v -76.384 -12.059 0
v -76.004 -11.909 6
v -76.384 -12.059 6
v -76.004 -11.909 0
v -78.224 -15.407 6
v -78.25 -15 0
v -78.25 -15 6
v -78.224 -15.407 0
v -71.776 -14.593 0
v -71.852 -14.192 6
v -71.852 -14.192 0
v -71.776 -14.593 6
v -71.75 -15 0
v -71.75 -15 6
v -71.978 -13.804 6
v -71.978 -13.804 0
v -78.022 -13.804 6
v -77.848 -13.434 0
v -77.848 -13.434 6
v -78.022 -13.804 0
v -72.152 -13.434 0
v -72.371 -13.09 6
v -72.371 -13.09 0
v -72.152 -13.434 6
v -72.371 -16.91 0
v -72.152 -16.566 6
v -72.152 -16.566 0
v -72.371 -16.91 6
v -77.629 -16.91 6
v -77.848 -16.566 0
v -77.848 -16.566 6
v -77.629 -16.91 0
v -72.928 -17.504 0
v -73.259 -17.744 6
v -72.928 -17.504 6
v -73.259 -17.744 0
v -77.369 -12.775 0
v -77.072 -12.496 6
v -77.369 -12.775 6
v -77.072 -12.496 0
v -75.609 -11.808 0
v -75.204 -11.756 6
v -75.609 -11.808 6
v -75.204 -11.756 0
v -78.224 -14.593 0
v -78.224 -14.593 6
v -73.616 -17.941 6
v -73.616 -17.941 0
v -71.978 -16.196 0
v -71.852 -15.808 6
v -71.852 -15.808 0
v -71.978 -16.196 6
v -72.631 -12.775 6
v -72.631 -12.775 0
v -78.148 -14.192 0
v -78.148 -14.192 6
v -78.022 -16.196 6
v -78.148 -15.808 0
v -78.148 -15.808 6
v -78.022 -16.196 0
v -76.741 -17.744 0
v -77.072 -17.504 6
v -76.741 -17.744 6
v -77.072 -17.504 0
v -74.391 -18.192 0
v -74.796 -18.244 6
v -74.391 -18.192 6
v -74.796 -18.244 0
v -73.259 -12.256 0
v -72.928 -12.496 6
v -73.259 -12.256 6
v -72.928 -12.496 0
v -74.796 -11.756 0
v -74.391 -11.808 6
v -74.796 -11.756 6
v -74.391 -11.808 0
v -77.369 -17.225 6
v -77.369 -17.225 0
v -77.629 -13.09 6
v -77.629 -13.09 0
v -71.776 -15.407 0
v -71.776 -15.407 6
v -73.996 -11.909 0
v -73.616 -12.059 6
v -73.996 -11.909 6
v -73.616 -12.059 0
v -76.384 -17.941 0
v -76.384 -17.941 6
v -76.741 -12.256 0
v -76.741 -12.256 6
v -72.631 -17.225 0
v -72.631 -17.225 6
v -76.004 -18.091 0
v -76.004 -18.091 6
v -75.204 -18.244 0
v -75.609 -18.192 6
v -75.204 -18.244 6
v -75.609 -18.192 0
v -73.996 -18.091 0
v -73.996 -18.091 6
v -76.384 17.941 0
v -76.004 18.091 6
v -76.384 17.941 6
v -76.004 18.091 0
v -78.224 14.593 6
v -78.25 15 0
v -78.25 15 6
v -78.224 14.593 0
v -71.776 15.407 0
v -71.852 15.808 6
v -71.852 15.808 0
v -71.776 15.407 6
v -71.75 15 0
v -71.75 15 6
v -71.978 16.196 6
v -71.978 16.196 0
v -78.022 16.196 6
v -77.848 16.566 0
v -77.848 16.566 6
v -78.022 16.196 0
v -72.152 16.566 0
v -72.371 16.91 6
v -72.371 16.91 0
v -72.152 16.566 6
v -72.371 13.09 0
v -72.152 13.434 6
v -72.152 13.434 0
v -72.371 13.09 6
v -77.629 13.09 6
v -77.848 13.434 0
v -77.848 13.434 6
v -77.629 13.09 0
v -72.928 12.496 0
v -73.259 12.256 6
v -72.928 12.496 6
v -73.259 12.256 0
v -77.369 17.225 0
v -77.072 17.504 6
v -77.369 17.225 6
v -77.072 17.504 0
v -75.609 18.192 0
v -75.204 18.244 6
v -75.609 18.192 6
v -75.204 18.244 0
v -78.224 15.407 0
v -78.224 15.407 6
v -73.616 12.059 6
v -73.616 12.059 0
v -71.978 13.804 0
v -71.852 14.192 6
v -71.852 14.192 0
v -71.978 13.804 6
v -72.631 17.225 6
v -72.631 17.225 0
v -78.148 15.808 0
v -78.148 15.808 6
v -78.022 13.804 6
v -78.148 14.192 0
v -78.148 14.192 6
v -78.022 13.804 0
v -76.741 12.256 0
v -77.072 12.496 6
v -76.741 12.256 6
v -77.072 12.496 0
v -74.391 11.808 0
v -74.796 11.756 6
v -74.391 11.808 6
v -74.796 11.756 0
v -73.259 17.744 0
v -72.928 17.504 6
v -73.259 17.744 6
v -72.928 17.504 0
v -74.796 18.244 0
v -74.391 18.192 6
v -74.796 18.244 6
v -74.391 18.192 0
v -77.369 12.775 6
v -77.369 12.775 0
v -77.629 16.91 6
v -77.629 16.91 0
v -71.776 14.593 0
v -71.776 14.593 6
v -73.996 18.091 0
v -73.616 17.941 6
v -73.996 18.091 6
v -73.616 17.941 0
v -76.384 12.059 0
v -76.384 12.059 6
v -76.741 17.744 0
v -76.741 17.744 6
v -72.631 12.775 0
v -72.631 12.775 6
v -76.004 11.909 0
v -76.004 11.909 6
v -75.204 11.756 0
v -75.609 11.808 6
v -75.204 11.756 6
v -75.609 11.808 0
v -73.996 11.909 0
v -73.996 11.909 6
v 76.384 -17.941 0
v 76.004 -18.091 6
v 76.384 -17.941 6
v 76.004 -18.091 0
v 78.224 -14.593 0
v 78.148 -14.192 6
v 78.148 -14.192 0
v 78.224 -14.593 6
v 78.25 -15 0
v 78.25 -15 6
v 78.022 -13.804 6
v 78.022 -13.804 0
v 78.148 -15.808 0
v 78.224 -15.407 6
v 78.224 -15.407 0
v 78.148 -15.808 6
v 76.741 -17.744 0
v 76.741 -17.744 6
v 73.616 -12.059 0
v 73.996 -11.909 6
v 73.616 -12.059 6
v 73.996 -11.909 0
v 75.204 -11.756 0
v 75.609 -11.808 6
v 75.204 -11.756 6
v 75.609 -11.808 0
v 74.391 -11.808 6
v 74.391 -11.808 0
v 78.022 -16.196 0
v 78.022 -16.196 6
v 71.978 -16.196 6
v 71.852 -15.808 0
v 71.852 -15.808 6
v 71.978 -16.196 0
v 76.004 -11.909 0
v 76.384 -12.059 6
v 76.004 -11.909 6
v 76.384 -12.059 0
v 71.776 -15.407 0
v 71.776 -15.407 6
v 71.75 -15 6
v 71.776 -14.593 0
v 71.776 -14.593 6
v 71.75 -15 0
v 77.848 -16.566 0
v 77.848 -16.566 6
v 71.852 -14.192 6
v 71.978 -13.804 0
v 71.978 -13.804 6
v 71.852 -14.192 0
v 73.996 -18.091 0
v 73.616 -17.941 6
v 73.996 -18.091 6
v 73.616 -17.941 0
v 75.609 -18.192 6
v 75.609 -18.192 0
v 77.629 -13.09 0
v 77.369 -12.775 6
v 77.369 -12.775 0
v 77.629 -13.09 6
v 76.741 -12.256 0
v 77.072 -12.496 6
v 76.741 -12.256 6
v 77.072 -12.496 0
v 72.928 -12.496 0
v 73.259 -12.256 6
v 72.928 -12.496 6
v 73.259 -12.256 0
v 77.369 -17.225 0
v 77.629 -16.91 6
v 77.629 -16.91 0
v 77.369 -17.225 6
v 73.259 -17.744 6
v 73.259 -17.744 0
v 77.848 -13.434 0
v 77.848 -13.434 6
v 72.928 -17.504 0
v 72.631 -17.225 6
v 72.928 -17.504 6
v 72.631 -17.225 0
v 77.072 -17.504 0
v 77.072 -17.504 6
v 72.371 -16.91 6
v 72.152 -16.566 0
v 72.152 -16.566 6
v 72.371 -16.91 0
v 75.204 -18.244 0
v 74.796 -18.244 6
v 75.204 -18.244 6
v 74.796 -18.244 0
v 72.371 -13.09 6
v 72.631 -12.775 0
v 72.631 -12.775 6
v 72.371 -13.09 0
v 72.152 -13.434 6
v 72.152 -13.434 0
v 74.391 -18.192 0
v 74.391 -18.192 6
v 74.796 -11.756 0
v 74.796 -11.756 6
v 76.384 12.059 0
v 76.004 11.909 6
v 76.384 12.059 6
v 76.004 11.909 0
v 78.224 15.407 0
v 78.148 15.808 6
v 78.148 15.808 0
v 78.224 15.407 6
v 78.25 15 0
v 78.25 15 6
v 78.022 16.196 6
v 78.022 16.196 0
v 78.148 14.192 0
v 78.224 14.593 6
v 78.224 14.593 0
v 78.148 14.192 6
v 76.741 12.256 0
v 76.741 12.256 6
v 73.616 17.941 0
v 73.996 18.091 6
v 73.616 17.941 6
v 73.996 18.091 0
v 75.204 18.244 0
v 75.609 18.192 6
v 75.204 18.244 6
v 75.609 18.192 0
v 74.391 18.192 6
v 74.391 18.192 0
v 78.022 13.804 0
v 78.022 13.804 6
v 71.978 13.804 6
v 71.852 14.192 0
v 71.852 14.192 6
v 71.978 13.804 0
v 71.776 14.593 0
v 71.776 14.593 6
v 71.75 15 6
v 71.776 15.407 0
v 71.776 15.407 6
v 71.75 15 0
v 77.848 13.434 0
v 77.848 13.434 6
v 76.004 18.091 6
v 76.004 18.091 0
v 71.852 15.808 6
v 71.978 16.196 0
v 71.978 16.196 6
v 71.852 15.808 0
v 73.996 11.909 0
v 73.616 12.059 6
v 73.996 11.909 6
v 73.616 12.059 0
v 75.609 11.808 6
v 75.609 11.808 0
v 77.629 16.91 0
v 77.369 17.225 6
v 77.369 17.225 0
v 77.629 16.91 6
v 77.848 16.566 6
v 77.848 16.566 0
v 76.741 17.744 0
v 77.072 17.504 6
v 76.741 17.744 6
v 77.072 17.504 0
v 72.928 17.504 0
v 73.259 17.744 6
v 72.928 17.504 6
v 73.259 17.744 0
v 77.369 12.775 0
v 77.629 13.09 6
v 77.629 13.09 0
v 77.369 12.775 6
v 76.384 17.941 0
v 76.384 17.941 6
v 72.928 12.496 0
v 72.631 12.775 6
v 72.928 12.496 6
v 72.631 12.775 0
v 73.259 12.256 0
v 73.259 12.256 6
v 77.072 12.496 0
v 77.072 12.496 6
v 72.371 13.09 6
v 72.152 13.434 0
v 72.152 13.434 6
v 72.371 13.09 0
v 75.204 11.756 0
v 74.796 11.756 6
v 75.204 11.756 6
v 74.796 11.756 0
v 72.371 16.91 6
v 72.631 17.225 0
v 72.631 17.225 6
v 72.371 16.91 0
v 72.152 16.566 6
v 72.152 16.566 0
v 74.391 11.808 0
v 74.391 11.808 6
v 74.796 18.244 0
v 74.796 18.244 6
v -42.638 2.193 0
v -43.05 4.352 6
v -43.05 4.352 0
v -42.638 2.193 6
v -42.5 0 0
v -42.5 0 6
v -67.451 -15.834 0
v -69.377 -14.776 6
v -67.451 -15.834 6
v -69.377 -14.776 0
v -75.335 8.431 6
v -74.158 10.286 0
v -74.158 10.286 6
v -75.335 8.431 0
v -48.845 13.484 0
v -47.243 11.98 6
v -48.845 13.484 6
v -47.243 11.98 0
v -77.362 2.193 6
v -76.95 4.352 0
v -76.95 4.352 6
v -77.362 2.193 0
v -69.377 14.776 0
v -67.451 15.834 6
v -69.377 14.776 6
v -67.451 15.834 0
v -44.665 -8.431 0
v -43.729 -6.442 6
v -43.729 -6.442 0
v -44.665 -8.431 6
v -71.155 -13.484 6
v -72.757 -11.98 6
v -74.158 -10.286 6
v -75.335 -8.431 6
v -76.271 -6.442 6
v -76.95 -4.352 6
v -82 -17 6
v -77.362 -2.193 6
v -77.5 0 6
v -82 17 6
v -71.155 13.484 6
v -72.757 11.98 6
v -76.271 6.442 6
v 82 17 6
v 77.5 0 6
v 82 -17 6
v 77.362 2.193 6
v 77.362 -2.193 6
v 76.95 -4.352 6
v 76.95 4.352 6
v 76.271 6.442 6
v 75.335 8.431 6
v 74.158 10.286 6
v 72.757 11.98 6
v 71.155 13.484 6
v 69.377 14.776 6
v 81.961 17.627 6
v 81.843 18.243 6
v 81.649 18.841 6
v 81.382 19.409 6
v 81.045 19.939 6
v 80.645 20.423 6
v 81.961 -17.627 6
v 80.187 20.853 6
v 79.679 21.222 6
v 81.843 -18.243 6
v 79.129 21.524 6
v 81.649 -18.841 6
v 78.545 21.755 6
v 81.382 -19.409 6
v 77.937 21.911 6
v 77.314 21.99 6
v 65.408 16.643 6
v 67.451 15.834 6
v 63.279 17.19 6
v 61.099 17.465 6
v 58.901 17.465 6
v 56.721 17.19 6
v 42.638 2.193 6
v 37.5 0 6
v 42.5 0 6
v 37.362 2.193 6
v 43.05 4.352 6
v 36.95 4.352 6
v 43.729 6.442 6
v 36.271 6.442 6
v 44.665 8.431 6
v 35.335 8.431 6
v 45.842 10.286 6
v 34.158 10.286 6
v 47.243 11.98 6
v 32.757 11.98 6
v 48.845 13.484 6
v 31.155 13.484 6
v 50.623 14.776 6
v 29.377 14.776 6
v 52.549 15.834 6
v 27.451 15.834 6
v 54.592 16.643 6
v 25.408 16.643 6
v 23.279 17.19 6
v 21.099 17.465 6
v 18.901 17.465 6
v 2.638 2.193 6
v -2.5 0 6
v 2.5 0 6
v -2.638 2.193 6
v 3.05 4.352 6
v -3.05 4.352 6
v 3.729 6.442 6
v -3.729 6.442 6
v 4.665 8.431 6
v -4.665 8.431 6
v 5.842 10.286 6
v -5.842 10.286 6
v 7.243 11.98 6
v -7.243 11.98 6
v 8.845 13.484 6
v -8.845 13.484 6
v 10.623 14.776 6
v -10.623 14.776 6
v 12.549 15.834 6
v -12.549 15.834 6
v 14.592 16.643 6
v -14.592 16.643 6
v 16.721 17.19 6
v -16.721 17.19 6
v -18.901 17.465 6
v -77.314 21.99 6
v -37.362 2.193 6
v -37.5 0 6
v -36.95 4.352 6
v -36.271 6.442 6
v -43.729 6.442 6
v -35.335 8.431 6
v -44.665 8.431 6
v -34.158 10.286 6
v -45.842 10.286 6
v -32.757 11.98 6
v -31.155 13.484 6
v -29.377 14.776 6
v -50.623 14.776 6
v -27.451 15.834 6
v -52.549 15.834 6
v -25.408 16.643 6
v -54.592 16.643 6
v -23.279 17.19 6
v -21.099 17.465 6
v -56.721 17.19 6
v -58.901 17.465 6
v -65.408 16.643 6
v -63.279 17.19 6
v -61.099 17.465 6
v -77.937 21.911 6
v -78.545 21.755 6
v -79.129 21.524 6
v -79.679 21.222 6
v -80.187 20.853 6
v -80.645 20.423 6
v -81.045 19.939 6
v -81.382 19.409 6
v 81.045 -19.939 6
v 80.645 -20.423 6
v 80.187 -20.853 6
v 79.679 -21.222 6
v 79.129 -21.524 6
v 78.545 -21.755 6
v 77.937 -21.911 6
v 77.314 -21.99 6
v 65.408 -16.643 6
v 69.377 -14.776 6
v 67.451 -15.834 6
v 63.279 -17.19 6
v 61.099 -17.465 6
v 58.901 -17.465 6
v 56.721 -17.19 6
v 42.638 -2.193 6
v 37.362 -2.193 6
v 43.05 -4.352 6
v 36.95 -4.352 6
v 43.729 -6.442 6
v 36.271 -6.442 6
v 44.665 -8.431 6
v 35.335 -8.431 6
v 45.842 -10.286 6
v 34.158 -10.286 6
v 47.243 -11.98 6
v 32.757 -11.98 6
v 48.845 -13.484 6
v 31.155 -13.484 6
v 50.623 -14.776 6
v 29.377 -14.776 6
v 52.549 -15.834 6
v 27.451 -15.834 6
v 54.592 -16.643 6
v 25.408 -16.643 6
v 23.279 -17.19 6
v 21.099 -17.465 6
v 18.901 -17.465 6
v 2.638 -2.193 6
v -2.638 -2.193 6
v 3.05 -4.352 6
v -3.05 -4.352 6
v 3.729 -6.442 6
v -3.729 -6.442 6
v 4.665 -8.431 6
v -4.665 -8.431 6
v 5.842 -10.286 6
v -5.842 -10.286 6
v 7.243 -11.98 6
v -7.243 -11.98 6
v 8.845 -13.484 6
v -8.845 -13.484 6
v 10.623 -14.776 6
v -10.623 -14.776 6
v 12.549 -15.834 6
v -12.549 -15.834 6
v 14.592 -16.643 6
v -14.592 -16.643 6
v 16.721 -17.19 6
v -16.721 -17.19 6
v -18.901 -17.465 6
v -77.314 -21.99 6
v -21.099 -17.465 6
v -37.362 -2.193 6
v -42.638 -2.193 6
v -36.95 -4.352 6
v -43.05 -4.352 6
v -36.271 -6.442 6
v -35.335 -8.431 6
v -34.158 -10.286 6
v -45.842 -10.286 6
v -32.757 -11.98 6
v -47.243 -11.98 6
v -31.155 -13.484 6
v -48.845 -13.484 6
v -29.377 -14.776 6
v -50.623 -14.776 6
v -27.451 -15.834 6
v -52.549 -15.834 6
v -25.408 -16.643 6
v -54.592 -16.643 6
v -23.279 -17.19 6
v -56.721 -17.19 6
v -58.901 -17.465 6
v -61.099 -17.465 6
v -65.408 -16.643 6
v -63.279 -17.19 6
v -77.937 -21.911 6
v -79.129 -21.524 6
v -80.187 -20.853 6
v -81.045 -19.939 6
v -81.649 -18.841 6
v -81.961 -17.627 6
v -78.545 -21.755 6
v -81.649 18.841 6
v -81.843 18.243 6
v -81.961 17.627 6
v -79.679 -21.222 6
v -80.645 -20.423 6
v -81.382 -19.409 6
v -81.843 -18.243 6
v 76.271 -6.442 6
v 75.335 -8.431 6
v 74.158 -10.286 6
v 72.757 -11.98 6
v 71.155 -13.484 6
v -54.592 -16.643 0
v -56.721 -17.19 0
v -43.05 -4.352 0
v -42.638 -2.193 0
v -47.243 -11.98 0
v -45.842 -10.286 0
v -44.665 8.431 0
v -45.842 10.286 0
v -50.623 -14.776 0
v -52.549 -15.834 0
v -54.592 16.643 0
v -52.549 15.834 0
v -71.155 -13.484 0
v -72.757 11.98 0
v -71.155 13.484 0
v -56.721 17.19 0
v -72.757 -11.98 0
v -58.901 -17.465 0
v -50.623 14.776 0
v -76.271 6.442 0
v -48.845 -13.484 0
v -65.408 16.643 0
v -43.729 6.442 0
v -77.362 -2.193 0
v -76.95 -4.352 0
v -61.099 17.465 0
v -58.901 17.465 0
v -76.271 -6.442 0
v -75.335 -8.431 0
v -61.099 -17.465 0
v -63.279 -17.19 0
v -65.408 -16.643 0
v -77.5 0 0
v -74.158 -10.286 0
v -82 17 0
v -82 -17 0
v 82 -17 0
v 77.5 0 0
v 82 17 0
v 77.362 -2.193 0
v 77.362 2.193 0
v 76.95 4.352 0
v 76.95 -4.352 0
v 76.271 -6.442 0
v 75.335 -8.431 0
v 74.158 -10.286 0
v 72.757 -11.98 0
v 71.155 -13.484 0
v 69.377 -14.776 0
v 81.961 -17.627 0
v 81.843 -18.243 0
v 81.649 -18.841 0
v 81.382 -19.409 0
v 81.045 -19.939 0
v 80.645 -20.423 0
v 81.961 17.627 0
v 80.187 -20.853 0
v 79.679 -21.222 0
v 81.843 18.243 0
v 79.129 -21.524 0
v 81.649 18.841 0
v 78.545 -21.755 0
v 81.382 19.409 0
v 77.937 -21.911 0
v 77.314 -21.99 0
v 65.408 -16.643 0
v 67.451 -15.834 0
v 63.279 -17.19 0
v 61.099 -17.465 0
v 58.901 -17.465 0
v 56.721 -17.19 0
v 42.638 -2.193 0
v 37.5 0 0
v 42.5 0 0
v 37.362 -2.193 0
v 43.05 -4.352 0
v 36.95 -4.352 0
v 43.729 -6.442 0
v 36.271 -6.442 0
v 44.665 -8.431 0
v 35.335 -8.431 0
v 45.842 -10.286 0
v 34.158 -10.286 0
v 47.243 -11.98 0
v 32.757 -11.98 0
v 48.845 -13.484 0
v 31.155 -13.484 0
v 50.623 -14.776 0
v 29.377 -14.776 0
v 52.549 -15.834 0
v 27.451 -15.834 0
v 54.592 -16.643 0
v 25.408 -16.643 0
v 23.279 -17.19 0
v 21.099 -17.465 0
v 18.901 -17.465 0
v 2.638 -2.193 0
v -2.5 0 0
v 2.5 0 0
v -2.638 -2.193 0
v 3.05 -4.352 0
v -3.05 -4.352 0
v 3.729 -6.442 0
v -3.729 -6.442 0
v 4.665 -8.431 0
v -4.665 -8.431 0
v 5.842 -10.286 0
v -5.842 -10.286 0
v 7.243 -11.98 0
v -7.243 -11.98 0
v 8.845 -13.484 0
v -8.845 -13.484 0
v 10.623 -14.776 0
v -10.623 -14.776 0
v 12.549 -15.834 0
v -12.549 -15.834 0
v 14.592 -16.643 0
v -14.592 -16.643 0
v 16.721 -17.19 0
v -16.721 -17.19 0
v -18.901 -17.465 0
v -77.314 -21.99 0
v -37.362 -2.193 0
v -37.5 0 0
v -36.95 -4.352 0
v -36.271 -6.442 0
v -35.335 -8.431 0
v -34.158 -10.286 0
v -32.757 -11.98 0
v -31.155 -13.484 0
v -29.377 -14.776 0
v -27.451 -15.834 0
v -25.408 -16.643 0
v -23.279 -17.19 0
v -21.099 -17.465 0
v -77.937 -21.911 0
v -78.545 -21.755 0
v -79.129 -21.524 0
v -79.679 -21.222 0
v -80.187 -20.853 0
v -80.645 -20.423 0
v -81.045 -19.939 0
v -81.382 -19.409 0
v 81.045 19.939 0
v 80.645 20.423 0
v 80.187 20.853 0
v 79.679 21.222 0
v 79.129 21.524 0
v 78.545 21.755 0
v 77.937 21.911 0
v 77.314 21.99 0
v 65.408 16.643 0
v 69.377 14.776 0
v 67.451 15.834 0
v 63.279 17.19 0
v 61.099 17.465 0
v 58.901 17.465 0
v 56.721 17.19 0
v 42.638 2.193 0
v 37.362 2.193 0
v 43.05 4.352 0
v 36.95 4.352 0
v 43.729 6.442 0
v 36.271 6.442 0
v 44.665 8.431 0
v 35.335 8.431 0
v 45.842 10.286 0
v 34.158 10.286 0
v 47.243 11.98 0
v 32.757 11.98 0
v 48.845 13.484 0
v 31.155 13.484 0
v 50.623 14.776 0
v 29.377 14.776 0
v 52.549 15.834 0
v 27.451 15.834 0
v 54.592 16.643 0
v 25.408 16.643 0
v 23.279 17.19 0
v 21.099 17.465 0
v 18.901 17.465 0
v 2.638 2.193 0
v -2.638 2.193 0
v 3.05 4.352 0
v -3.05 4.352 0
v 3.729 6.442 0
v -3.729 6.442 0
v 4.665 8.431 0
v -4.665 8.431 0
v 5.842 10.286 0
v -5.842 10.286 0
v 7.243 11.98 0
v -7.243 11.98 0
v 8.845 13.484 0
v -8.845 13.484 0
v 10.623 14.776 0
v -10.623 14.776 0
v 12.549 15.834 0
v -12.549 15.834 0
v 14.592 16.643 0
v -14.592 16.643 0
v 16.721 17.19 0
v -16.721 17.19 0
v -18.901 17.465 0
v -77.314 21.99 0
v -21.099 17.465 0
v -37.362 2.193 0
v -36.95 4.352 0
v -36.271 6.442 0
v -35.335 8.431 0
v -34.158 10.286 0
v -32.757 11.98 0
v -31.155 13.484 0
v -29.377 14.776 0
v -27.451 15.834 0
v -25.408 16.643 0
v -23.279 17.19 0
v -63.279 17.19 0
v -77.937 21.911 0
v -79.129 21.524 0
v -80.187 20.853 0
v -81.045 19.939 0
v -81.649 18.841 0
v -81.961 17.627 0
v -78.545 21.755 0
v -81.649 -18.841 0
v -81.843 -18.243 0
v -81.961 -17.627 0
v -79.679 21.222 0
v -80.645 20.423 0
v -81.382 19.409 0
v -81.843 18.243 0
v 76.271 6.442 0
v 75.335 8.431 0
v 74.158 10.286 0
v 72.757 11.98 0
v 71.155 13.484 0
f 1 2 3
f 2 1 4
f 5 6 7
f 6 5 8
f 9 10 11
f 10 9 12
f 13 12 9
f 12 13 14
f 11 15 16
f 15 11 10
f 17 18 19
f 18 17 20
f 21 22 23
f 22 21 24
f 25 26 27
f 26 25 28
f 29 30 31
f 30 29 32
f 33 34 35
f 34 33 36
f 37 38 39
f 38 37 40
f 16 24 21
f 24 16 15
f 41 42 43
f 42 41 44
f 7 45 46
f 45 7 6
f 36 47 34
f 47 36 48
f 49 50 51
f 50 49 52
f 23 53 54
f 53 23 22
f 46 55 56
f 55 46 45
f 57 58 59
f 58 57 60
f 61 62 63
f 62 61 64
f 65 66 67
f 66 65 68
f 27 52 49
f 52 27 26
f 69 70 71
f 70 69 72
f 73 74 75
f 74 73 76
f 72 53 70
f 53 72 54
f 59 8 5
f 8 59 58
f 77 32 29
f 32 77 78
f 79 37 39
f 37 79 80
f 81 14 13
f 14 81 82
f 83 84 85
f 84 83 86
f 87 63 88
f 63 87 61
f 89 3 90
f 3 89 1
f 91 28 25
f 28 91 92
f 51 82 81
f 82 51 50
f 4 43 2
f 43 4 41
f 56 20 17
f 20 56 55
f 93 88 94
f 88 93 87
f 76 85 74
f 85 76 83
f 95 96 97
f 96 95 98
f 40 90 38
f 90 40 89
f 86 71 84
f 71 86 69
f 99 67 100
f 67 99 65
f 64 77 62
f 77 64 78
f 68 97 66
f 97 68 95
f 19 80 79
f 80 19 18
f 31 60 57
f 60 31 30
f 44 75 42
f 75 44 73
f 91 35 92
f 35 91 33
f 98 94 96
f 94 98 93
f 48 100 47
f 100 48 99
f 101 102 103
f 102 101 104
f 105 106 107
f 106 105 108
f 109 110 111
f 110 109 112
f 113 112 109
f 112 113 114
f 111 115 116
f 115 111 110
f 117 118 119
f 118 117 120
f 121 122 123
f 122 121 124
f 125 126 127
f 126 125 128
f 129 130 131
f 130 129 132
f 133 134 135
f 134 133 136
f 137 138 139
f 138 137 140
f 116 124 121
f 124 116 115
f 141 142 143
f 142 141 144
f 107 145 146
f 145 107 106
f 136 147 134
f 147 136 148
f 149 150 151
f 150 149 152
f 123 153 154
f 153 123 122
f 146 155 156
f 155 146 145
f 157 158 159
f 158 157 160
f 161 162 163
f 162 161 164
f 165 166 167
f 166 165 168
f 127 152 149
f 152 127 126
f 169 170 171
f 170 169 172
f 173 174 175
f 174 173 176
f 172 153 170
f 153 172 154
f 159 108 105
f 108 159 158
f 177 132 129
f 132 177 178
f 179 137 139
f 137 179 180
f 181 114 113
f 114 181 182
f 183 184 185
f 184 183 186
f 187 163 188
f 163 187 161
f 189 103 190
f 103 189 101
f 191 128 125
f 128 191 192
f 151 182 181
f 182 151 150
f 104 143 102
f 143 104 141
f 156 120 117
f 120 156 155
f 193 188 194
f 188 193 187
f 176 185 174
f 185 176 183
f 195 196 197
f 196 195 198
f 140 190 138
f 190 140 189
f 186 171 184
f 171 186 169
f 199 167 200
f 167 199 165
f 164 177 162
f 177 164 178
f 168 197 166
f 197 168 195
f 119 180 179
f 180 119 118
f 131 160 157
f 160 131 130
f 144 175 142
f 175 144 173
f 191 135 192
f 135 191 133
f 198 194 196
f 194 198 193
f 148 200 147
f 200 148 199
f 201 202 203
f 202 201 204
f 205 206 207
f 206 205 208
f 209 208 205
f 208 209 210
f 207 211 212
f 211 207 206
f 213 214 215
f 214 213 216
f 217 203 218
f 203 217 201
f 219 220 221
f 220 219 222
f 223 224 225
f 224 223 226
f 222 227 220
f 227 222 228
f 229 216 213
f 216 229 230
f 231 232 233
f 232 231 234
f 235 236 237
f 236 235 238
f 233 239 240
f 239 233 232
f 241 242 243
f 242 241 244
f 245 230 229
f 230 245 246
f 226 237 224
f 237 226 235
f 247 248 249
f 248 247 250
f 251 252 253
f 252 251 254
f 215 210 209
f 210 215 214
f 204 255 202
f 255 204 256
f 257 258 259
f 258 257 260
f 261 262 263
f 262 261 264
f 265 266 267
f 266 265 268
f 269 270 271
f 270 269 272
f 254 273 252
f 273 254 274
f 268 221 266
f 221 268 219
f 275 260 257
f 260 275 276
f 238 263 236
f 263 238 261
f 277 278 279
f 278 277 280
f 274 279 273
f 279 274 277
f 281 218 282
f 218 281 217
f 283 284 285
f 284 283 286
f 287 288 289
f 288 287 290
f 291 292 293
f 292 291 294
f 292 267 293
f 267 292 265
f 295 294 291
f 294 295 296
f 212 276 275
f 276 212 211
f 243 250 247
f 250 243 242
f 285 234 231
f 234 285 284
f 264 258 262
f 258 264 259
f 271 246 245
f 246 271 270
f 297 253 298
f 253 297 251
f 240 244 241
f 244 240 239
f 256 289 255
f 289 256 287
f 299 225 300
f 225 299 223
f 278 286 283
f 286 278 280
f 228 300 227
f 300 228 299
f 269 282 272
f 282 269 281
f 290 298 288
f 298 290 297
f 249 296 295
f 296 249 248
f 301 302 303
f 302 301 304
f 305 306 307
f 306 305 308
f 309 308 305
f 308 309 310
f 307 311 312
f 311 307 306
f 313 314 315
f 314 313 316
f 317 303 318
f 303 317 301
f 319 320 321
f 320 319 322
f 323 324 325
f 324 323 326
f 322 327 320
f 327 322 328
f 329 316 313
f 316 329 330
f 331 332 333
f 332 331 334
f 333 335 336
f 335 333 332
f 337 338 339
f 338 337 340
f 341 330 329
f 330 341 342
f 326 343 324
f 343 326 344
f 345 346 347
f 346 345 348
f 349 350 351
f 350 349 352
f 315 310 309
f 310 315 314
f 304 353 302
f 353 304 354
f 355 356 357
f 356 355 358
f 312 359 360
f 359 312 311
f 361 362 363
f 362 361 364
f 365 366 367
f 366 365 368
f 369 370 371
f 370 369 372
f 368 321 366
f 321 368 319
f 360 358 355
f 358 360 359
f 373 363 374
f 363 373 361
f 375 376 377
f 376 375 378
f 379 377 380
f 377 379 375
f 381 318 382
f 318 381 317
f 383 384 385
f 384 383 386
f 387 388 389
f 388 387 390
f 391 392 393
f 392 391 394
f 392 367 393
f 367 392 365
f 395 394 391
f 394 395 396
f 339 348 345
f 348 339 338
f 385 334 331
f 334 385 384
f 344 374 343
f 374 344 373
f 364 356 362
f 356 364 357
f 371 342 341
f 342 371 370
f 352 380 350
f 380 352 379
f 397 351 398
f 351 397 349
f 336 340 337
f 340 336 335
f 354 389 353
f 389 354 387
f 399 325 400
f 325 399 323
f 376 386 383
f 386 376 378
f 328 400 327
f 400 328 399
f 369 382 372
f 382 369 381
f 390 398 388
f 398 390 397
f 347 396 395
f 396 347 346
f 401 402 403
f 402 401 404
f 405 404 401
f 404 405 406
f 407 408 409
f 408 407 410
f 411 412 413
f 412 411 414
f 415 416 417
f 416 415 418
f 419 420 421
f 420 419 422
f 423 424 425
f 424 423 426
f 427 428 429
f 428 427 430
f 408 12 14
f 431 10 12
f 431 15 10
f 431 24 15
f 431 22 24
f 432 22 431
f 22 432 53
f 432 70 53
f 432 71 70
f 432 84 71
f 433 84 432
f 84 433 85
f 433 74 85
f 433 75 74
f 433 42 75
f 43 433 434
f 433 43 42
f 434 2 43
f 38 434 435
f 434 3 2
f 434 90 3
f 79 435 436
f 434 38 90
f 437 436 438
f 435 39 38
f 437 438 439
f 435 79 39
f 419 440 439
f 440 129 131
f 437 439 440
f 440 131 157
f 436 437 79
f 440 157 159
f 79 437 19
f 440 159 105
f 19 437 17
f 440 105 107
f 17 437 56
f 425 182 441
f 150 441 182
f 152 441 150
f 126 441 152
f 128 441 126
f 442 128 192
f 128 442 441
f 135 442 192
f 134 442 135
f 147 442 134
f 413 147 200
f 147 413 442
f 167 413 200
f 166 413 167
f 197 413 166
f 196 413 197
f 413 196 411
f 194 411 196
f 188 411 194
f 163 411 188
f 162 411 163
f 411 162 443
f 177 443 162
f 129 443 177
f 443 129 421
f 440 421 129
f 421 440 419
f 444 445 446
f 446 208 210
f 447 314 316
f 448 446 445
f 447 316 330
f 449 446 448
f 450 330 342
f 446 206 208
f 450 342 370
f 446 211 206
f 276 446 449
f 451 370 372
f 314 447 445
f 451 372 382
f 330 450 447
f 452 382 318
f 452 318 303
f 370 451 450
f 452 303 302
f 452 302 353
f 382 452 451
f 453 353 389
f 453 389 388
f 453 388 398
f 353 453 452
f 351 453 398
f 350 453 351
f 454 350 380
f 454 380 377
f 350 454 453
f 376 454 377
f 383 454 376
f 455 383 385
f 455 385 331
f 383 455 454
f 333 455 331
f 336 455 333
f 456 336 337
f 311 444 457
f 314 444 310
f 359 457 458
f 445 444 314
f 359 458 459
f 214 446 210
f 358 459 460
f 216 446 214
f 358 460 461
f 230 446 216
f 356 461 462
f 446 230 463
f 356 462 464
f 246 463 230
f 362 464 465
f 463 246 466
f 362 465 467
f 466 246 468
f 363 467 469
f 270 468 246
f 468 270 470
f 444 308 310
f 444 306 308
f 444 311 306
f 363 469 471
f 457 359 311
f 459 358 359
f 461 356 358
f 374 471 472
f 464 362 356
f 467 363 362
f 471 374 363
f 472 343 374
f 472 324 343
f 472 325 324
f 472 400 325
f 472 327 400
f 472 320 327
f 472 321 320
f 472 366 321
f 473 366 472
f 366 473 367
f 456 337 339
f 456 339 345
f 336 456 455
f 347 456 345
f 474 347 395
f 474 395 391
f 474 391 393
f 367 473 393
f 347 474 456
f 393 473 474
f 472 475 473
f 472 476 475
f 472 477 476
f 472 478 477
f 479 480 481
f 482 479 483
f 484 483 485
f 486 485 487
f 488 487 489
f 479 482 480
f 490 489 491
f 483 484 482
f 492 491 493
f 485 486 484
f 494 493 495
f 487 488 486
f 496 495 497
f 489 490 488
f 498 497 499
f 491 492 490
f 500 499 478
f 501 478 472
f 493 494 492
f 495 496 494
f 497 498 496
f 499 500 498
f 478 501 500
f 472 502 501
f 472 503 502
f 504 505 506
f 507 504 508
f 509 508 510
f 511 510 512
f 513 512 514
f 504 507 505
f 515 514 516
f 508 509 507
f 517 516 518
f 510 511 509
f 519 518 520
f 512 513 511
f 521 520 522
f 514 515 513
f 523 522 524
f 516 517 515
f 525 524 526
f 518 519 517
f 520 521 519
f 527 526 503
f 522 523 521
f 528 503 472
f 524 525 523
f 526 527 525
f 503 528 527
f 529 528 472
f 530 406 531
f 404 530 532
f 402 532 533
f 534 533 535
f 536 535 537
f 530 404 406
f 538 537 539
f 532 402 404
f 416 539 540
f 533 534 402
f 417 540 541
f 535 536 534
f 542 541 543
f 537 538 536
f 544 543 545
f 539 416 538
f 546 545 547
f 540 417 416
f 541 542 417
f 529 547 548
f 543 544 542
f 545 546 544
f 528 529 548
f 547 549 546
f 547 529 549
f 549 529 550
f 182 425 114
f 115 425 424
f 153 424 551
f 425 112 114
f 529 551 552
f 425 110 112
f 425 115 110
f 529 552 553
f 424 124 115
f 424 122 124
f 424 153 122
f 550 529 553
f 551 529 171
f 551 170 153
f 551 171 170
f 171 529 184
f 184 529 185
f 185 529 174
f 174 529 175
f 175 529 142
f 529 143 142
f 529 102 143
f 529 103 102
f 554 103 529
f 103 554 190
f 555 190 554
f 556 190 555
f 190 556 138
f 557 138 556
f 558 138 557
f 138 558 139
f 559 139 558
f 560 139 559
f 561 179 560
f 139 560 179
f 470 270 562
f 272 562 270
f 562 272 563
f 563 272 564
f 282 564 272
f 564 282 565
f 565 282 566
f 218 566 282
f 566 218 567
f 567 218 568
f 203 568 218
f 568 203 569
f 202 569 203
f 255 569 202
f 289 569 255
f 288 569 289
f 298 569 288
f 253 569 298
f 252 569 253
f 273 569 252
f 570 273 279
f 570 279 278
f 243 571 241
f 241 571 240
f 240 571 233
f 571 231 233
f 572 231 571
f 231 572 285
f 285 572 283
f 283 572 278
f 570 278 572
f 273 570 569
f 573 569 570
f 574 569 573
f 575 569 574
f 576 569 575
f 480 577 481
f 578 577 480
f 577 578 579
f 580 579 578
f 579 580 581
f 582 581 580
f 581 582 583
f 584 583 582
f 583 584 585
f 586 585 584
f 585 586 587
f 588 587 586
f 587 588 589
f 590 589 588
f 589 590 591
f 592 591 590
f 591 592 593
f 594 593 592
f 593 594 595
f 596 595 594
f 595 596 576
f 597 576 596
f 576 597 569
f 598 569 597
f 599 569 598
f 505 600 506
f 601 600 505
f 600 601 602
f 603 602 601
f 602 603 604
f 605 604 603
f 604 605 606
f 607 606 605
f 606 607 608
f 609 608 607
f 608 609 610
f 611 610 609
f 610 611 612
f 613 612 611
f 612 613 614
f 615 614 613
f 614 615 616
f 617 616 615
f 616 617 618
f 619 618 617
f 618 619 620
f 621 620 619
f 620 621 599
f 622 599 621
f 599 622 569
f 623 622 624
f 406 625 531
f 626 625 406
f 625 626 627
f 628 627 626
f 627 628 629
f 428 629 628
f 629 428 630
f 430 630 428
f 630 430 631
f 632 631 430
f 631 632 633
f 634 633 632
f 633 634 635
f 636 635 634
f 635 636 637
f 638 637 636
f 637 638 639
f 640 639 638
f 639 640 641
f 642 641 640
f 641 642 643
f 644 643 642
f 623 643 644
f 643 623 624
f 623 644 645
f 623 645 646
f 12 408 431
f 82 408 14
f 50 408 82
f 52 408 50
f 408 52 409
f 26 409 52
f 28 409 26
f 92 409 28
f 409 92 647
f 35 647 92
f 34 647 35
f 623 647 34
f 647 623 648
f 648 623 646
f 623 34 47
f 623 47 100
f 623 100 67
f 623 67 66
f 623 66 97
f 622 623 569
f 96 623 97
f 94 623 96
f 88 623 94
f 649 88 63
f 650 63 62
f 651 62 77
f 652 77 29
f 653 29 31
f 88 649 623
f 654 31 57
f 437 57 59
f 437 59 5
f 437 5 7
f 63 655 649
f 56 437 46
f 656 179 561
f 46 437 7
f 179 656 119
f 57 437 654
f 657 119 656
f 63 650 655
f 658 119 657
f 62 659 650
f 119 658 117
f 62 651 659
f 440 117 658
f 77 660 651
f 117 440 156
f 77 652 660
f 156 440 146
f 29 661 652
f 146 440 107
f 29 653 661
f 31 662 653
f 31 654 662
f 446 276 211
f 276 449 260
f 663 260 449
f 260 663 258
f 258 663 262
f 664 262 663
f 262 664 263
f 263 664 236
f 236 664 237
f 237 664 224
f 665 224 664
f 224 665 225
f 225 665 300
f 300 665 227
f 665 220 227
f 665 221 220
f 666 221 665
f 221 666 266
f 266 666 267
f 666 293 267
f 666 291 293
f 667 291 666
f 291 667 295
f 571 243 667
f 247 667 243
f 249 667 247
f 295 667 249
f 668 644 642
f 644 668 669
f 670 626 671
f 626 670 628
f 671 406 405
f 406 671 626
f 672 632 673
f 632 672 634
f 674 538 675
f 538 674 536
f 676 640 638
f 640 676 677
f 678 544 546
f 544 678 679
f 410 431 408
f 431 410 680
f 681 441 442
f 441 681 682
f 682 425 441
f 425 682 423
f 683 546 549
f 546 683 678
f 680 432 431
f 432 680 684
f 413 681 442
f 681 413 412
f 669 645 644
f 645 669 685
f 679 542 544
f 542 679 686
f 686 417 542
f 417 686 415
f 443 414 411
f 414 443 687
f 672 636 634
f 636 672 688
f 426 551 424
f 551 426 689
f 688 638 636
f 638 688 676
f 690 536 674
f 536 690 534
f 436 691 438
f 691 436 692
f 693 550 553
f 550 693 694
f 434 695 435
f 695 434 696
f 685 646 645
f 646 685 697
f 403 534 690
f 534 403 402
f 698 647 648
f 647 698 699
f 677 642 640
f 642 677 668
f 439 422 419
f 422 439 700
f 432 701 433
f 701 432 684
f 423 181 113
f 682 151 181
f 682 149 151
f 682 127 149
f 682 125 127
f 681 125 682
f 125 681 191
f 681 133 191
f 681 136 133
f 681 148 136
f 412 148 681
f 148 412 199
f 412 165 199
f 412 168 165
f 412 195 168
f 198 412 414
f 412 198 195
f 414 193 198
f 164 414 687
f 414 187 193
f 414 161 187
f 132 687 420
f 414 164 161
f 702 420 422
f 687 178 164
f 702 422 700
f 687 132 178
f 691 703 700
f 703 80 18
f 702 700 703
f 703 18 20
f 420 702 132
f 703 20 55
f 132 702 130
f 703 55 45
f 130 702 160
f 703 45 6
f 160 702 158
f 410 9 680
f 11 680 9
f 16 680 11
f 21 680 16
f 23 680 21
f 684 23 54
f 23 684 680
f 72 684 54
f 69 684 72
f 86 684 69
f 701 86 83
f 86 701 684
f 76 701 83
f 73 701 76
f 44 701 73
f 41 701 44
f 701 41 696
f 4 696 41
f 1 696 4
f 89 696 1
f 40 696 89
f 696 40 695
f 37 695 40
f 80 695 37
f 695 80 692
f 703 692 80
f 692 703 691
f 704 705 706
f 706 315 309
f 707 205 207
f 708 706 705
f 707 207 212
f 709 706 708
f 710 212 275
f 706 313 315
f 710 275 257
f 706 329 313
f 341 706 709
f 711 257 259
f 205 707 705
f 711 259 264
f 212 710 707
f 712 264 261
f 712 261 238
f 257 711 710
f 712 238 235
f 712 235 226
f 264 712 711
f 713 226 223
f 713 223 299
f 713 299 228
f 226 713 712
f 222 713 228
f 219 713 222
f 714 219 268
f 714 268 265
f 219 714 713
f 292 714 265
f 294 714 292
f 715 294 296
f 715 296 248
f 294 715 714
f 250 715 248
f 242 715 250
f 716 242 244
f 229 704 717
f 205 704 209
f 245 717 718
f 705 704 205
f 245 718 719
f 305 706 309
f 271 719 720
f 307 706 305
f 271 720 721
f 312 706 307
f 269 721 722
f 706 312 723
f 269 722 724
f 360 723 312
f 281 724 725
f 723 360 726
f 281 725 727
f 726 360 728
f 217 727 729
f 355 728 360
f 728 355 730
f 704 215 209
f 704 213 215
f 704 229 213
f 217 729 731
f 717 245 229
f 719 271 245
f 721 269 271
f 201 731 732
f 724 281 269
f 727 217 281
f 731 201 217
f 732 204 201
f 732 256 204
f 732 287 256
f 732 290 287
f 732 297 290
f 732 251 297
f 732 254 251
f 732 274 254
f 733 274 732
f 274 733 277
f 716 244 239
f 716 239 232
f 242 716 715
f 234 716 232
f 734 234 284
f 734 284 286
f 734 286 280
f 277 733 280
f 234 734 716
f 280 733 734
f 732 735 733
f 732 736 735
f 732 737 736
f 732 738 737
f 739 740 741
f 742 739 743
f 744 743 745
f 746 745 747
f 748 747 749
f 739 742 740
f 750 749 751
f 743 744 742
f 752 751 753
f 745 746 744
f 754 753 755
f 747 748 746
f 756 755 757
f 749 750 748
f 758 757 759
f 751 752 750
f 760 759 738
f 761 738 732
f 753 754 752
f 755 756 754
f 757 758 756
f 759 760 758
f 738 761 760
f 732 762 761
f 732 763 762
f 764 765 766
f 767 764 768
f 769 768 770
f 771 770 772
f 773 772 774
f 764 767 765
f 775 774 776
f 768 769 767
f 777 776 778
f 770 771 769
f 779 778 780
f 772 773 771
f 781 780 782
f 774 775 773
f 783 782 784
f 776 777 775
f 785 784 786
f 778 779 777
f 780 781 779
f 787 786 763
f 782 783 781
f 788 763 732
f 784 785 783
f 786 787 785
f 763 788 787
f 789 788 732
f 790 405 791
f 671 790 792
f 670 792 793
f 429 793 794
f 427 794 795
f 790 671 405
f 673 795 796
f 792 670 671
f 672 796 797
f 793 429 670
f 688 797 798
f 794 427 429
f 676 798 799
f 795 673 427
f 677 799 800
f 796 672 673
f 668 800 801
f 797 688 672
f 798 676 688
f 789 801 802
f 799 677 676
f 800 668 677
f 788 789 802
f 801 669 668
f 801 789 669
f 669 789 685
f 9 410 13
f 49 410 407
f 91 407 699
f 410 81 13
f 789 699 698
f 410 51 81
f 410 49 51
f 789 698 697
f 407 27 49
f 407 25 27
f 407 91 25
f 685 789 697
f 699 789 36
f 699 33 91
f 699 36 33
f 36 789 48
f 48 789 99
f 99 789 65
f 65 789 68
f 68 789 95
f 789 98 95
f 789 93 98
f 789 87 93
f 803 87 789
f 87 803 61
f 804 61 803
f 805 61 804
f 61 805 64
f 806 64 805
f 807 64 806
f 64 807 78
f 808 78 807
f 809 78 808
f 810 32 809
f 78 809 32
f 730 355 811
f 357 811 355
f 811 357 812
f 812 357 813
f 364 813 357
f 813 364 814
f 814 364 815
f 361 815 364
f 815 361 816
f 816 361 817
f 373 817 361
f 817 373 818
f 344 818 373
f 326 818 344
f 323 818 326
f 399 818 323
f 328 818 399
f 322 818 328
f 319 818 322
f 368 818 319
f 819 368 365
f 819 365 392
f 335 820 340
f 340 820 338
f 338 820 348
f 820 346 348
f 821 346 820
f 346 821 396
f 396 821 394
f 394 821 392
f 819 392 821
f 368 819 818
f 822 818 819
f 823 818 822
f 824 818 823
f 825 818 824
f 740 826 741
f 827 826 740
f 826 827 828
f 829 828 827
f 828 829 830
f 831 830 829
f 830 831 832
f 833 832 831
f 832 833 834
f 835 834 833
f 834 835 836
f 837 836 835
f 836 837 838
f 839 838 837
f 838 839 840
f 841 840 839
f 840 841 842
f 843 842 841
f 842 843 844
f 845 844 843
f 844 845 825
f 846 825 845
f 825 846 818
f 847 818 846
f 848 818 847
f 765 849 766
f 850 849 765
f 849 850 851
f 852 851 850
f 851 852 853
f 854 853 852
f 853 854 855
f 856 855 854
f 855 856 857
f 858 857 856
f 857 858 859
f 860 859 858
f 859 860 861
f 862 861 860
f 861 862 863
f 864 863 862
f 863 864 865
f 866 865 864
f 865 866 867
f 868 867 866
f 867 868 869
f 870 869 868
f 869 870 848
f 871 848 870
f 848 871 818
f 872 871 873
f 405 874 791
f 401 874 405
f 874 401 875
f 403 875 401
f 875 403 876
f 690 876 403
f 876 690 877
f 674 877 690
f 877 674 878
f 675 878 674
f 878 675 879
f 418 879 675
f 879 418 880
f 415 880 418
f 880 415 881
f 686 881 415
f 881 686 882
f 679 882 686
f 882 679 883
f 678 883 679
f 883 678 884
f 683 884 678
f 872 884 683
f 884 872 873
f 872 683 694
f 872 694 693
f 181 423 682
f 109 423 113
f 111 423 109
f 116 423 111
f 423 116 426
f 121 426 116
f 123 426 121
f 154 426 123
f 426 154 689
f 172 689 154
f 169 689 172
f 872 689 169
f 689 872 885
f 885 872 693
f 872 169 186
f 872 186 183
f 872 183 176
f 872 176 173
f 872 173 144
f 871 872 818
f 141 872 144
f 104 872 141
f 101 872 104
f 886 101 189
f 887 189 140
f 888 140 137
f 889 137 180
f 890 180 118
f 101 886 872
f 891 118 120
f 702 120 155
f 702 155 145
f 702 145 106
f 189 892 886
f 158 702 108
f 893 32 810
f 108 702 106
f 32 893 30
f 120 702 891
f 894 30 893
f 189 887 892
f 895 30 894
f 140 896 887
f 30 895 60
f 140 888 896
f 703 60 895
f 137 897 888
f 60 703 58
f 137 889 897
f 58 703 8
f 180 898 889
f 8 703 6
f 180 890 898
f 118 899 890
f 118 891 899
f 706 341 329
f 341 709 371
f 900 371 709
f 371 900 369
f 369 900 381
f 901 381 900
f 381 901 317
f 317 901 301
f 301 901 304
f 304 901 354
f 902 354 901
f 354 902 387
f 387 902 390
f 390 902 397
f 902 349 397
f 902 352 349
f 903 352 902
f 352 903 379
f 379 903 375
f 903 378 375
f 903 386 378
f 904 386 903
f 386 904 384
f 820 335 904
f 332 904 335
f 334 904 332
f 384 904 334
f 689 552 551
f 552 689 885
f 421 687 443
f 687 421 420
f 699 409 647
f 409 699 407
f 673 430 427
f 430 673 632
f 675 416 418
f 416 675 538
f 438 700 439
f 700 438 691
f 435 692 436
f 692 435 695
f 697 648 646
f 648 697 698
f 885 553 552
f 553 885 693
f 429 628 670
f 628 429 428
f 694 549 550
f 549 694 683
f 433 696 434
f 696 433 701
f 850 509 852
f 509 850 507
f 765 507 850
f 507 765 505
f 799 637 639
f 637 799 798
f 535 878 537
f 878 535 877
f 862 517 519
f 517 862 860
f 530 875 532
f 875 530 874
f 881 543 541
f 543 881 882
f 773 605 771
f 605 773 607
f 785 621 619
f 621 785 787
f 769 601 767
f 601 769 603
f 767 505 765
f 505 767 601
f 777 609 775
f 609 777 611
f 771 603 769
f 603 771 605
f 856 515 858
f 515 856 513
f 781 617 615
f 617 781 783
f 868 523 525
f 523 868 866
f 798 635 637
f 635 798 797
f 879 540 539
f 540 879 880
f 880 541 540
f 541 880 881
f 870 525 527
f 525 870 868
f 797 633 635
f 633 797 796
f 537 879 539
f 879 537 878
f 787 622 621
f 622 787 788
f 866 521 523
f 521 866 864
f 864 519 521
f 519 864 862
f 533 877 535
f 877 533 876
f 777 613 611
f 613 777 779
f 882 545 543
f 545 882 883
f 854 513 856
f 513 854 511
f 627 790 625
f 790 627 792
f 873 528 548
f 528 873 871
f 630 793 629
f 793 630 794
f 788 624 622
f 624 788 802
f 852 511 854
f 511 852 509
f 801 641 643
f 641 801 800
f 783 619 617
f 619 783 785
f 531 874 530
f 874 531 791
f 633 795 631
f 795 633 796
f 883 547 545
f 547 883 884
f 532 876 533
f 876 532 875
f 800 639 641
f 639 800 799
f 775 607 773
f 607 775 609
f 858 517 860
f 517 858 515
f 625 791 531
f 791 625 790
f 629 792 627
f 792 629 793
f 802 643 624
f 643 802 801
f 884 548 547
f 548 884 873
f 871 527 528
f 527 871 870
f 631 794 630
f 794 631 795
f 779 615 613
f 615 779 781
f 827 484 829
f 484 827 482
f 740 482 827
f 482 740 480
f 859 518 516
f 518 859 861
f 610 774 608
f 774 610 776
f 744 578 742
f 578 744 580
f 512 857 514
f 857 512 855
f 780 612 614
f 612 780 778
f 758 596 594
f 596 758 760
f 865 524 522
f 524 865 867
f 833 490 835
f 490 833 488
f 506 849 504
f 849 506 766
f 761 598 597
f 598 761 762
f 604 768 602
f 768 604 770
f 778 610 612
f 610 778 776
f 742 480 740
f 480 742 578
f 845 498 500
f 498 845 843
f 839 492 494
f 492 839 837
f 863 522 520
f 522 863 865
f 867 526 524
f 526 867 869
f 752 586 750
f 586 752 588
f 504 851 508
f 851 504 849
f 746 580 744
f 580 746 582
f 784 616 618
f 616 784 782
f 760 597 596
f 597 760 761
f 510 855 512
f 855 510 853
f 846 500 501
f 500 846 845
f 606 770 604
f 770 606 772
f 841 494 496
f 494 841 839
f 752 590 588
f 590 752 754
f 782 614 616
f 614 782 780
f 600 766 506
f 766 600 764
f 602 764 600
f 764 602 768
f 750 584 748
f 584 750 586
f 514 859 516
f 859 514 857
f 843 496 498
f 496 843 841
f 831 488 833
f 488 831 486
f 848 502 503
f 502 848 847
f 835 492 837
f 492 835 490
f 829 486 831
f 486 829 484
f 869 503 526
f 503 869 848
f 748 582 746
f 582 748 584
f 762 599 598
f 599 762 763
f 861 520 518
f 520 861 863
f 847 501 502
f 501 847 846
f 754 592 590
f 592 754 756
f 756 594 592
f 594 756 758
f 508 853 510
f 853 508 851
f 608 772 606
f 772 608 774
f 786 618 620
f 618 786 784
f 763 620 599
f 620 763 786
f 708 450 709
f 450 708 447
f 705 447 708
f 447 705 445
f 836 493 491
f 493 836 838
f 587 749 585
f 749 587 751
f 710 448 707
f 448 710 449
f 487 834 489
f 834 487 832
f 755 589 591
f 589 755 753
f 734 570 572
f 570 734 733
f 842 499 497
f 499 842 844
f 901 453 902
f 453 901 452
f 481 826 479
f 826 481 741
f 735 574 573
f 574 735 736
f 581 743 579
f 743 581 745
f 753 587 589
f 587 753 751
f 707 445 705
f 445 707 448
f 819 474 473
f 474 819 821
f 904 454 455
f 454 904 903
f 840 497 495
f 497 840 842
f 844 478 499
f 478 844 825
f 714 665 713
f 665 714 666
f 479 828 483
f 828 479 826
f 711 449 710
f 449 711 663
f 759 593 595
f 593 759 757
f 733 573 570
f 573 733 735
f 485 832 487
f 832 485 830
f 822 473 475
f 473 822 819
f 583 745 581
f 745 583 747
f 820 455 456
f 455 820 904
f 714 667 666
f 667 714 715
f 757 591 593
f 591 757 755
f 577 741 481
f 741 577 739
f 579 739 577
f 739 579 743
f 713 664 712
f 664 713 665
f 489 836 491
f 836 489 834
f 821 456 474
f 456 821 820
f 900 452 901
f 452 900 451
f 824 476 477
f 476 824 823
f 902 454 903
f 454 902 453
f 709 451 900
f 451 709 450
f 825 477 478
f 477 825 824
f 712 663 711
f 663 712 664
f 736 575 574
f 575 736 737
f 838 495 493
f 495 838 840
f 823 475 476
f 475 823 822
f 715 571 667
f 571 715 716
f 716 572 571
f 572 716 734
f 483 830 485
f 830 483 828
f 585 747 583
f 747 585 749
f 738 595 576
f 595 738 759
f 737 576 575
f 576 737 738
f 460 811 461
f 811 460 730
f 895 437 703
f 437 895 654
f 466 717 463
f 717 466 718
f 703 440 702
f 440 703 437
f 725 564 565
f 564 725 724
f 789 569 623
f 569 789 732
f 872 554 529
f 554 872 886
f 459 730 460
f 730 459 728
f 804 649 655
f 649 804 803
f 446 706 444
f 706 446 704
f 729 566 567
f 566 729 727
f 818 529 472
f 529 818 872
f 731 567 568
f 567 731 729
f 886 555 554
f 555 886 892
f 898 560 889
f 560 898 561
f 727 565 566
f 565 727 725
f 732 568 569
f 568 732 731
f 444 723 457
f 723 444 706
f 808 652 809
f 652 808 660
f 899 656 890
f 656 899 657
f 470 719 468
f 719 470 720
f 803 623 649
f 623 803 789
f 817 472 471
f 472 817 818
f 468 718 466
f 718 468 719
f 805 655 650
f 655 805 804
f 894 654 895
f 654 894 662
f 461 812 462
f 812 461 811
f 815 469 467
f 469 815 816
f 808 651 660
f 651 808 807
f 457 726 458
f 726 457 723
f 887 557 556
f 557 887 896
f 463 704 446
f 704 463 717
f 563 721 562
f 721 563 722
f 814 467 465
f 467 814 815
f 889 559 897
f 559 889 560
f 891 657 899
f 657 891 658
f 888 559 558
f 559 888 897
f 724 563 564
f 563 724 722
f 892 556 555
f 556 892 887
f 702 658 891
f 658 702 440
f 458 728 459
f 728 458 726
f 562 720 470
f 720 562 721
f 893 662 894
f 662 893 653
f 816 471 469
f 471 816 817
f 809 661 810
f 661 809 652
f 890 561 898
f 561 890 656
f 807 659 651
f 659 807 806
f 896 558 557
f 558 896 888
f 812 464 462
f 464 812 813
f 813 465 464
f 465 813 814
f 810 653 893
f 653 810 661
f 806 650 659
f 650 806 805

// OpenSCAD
$fn = 50;


difference() {
	union() {
		hull() {
			translate(v = [-77.0000000000, 17.0000000000, 0]) {
				cylinder(h = 6, r = 5);
			}
			translate(v = [77.0000000000, 17.0000000000, 0]) {
				cylinder(h = 6, r = 5);
			}
			translate(v = [-77.0000000000, -17.0000000000, 0]) {
				cylinder(h = 6, r = 5);
			}
			translate(v = [77.0000000000, -17.0000000000, 0]) {
				cylinder(h = 6, r = 5);
			}
		}
	}
	union() {
		#translate(v = [-75.0000000000, -15.0000000000, -100.0000000000]) {
			cylinder(h = 200, r = 3.2500000000);
		}
		#translate(v = [-75.0000000000, 15.0000000000, -100.0000000000]) {
			cylinder(h = 200, r = 3.2500000000);
		}
		#translate(v = [75.0000000000, -15.0000000000, -100.0000000000]) {
			cylinder(h = 200, r = 3.2500000000);
		}
		#translate(v = [75.0000000000, 15.0000000000, -100.0000000000]) {
			cylinder(h = 200, r = 3.2500000000);
		}
		#translate(v = [-60.0000000000, 0, 0]) {
			cylinder(h = 6, r = 17.5000000000);
		}
		#translate(v = [-20.0000000000, 0, 0]) {
			cylinder(h = 6, r = 17.5000000000);
		}
		#translate(v = [20.0000000000, 0, 0]) {
			cylinder(h = 6, r = 17.5000000000);
		}
		#translate(v = [60.0000000000, 0, 0]) {
			cylinder(h = 6, r = 17.5000000000);
		}
	}
}
